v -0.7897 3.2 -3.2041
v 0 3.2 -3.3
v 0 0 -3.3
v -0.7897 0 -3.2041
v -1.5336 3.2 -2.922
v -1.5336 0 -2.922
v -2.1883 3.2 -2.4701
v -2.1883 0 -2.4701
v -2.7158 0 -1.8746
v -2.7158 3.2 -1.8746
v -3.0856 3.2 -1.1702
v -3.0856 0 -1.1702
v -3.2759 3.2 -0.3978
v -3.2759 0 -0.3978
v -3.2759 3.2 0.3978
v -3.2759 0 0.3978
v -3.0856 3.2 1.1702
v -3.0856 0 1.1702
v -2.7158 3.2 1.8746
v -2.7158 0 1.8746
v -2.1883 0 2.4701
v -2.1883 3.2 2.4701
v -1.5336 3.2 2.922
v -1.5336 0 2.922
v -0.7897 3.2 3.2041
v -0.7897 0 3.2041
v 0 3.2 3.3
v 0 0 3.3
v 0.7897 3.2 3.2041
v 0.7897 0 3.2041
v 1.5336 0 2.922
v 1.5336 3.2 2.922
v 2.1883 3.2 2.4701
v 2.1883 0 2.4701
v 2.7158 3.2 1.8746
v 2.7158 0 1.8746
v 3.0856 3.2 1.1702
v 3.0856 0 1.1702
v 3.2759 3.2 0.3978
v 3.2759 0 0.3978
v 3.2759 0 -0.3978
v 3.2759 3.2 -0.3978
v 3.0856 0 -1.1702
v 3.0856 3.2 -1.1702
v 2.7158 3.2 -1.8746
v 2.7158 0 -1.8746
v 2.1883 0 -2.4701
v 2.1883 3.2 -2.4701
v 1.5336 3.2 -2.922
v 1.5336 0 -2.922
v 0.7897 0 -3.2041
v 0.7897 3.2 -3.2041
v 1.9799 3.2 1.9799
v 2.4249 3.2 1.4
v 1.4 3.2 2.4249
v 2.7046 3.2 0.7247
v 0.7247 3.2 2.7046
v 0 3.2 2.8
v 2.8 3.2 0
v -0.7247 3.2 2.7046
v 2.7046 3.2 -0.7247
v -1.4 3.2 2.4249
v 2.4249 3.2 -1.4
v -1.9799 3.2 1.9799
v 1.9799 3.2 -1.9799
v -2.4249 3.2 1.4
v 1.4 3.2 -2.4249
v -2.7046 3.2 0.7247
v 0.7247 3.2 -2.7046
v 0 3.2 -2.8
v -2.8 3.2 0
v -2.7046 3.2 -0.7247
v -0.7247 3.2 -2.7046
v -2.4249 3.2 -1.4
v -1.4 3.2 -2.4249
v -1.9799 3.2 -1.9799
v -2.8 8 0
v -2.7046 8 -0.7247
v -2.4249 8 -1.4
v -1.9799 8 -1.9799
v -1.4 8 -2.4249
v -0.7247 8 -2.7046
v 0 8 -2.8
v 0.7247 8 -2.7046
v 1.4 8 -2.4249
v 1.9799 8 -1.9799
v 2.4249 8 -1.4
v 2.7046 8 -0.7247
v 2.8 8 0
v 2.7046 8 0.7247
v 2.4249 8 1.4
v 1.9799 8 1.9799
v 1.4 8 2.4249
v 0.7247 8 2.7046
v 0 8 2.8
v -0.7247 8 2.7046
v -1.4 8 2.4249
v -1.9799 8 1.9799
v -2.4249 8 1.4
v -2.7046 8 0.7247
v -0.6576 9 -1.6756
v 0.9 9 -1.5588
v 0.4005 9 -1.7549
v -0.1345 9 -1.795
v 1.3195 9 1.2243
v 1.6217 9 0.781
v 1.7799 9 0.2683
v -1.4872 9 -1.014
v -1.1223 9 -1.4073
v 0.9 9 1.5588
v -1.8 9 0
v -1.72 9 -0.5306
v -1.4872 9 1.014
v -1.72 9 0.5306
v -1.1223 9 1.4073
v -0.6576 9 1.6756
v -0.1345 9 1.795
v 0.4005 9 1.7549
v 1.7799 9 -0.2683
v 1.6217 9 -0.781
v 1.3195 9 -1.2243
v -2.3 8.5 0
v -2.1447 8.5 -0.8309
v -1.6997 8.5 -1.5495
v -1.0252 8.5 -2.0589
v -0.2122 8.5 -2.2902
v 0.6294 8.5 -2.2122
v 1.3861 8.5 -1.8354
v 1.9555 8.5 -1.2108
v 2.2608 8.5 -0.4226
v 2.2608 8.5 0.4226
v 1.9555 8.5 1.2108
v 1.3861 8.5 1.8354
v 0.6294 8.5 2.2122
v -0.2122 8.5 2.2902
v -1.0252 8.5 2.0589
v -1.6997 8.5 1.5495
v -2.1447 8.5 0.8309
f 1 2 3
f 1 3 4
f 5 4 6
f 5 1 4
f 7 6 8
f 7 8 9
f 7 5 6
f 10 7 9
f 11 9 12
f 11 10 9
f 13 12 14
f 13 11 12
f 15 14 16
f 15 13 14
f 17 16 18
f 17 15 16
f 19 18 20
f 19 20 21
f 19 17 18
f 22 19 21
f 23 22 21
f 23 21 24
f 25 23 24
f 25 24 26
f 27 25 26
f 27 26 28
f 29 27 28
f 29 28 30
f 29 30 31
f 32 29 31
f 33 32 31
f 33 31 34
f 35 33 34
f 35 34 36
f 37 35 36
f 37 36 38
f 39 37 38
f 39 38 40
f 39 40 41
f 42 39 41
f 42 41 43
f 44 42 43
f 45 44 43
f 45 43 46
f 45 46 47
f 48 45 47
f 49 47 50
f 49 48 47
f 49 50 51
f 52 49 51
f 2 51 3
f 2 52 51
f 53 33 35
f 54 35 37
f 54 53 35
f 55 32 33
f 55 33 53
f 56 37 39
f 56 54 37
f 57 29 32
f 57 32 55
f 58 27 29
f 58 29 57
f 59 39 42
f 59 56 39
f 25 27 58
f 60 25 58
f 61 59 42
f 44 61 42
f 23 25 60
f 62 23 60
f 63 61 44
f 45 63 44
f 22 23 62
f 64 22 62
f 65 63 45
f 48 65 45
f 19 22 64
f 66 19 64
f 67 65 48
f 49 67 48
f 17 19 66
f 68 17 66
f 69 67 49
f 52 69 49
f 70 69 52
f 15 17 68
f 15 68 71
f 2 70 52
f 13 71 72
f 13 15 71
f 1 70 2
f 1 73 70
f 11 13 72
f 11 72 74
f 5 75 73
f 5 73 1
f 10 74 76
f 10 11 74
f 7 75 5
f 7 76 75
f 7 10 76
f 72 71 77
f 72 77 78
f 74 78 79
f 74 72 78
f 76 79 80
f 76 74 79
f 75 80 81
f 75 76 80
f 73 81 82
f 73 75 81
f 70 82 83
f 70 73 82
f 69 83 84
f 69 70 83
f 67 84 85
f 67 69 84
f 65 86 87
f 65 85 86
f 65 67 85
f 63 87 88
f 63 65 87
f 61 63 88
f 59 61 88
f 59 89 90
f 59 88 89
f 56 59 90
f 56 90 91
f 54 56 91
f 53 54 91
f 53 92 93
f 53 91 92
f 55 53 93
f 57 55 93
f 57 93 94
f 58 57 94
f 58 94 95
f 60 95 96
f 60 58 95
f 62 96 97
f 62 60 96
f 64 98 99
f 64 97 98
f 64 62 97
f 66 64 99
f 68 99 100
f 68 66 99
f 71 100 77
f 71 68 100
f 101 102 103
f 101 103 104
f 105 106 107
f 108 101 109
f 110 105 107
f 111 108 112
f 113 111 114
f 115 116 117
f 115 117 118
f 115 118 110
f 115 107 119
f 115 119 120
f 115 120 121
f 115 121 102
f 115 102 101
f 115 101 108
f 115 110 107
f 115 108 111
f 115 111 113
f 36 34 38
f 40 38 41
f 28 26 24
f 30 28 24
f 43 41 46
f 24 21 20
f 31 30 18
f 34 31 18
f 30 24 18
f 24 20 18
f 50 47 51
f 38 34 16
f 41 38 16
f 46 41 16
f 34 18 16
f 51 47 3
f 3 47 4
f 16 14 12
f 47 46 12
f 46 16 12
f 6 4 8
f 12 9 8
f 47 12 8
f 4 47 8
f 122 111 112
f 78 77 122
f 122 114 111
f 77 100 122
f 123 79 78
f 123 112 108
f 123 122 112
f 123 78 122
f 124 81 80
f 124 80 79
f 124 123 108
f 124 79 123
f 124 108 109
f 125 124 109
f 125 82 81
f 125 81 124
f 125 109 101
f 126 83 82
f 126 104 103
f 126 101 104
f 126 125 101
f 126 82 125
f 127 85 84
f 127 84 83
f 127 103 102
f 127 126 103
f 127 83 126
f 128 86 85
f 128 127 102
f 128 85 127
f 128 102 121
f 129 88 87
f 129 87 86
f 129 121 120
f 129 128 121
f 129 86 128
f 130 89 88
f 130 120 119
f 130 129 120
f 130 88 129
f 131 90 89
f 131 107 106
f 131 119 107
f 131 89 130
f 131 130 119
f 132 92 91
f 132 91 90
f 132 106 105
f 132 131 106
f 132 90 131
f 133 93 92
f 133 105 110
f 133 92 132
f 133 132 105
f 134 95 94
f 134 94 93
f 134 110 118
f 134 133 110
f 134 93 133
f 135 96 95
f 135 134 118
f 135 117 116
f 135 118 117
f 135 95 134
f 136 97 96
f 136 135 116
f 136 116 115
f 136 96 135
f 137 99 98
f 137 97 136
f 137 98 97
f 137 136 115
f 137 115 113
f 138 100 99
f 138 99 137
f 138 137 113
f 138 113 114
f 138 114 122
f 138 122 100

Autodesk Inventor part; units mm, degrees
ref_plane "YZ Plane" through (0, 0, 0) normal (1, 0, 0) x (0, 1, 0)
ref_plane "XZ Plane" through (0, 0, 0) normal (0, 1, 0) x (-1, 0, 0)
ref_plane "XY Plane" through (0, 0, 0) normal (0, 0, 1) x (1, 0, 0)
sketch "Sketch1" plane through (0, 0, 0) normal (0, 1, 0) x (-1, 0, 0)
  circle A0 centre (0, 0) radius 2.8
  dimension "d0" = 5.6
extrude "Extrusion1" add sketch "Sketch1" along normal blind 9
chamfer "Chamfer1" distance 1 angle 45 1 edges at (2.8, 9, 0)
sketch "Sketch3" plane through (0, 0, 0) normal (1, 0, 0) x (0, 1, 0)
  line L0 (0, -2.8) -> (8, -2.8) projected
  line L1 (3.2, -2.8) -> (0, -2.8)
  line L2 (0, -2.8) -> (0, -3.3)
  line L3 (0, -3.3) -> (3.2, -3.3)
  line L4 (3.2, -3.3) -> (3.2, -2.8)
  line L5 (0, 2.8) -> (0, -2.8) projected
  line L6 (-1.8, 0) -> (10.8, 0) projected
  point P0 (0, 0)
  dimension "d9" = 3.2
  dimension "d11" = 0.5
revolve "Revolution1" add sketch "Sketch3" angle 360 about axis through (0, -10, 0) along (0, 1, 0)
properties part number "Knopf"
